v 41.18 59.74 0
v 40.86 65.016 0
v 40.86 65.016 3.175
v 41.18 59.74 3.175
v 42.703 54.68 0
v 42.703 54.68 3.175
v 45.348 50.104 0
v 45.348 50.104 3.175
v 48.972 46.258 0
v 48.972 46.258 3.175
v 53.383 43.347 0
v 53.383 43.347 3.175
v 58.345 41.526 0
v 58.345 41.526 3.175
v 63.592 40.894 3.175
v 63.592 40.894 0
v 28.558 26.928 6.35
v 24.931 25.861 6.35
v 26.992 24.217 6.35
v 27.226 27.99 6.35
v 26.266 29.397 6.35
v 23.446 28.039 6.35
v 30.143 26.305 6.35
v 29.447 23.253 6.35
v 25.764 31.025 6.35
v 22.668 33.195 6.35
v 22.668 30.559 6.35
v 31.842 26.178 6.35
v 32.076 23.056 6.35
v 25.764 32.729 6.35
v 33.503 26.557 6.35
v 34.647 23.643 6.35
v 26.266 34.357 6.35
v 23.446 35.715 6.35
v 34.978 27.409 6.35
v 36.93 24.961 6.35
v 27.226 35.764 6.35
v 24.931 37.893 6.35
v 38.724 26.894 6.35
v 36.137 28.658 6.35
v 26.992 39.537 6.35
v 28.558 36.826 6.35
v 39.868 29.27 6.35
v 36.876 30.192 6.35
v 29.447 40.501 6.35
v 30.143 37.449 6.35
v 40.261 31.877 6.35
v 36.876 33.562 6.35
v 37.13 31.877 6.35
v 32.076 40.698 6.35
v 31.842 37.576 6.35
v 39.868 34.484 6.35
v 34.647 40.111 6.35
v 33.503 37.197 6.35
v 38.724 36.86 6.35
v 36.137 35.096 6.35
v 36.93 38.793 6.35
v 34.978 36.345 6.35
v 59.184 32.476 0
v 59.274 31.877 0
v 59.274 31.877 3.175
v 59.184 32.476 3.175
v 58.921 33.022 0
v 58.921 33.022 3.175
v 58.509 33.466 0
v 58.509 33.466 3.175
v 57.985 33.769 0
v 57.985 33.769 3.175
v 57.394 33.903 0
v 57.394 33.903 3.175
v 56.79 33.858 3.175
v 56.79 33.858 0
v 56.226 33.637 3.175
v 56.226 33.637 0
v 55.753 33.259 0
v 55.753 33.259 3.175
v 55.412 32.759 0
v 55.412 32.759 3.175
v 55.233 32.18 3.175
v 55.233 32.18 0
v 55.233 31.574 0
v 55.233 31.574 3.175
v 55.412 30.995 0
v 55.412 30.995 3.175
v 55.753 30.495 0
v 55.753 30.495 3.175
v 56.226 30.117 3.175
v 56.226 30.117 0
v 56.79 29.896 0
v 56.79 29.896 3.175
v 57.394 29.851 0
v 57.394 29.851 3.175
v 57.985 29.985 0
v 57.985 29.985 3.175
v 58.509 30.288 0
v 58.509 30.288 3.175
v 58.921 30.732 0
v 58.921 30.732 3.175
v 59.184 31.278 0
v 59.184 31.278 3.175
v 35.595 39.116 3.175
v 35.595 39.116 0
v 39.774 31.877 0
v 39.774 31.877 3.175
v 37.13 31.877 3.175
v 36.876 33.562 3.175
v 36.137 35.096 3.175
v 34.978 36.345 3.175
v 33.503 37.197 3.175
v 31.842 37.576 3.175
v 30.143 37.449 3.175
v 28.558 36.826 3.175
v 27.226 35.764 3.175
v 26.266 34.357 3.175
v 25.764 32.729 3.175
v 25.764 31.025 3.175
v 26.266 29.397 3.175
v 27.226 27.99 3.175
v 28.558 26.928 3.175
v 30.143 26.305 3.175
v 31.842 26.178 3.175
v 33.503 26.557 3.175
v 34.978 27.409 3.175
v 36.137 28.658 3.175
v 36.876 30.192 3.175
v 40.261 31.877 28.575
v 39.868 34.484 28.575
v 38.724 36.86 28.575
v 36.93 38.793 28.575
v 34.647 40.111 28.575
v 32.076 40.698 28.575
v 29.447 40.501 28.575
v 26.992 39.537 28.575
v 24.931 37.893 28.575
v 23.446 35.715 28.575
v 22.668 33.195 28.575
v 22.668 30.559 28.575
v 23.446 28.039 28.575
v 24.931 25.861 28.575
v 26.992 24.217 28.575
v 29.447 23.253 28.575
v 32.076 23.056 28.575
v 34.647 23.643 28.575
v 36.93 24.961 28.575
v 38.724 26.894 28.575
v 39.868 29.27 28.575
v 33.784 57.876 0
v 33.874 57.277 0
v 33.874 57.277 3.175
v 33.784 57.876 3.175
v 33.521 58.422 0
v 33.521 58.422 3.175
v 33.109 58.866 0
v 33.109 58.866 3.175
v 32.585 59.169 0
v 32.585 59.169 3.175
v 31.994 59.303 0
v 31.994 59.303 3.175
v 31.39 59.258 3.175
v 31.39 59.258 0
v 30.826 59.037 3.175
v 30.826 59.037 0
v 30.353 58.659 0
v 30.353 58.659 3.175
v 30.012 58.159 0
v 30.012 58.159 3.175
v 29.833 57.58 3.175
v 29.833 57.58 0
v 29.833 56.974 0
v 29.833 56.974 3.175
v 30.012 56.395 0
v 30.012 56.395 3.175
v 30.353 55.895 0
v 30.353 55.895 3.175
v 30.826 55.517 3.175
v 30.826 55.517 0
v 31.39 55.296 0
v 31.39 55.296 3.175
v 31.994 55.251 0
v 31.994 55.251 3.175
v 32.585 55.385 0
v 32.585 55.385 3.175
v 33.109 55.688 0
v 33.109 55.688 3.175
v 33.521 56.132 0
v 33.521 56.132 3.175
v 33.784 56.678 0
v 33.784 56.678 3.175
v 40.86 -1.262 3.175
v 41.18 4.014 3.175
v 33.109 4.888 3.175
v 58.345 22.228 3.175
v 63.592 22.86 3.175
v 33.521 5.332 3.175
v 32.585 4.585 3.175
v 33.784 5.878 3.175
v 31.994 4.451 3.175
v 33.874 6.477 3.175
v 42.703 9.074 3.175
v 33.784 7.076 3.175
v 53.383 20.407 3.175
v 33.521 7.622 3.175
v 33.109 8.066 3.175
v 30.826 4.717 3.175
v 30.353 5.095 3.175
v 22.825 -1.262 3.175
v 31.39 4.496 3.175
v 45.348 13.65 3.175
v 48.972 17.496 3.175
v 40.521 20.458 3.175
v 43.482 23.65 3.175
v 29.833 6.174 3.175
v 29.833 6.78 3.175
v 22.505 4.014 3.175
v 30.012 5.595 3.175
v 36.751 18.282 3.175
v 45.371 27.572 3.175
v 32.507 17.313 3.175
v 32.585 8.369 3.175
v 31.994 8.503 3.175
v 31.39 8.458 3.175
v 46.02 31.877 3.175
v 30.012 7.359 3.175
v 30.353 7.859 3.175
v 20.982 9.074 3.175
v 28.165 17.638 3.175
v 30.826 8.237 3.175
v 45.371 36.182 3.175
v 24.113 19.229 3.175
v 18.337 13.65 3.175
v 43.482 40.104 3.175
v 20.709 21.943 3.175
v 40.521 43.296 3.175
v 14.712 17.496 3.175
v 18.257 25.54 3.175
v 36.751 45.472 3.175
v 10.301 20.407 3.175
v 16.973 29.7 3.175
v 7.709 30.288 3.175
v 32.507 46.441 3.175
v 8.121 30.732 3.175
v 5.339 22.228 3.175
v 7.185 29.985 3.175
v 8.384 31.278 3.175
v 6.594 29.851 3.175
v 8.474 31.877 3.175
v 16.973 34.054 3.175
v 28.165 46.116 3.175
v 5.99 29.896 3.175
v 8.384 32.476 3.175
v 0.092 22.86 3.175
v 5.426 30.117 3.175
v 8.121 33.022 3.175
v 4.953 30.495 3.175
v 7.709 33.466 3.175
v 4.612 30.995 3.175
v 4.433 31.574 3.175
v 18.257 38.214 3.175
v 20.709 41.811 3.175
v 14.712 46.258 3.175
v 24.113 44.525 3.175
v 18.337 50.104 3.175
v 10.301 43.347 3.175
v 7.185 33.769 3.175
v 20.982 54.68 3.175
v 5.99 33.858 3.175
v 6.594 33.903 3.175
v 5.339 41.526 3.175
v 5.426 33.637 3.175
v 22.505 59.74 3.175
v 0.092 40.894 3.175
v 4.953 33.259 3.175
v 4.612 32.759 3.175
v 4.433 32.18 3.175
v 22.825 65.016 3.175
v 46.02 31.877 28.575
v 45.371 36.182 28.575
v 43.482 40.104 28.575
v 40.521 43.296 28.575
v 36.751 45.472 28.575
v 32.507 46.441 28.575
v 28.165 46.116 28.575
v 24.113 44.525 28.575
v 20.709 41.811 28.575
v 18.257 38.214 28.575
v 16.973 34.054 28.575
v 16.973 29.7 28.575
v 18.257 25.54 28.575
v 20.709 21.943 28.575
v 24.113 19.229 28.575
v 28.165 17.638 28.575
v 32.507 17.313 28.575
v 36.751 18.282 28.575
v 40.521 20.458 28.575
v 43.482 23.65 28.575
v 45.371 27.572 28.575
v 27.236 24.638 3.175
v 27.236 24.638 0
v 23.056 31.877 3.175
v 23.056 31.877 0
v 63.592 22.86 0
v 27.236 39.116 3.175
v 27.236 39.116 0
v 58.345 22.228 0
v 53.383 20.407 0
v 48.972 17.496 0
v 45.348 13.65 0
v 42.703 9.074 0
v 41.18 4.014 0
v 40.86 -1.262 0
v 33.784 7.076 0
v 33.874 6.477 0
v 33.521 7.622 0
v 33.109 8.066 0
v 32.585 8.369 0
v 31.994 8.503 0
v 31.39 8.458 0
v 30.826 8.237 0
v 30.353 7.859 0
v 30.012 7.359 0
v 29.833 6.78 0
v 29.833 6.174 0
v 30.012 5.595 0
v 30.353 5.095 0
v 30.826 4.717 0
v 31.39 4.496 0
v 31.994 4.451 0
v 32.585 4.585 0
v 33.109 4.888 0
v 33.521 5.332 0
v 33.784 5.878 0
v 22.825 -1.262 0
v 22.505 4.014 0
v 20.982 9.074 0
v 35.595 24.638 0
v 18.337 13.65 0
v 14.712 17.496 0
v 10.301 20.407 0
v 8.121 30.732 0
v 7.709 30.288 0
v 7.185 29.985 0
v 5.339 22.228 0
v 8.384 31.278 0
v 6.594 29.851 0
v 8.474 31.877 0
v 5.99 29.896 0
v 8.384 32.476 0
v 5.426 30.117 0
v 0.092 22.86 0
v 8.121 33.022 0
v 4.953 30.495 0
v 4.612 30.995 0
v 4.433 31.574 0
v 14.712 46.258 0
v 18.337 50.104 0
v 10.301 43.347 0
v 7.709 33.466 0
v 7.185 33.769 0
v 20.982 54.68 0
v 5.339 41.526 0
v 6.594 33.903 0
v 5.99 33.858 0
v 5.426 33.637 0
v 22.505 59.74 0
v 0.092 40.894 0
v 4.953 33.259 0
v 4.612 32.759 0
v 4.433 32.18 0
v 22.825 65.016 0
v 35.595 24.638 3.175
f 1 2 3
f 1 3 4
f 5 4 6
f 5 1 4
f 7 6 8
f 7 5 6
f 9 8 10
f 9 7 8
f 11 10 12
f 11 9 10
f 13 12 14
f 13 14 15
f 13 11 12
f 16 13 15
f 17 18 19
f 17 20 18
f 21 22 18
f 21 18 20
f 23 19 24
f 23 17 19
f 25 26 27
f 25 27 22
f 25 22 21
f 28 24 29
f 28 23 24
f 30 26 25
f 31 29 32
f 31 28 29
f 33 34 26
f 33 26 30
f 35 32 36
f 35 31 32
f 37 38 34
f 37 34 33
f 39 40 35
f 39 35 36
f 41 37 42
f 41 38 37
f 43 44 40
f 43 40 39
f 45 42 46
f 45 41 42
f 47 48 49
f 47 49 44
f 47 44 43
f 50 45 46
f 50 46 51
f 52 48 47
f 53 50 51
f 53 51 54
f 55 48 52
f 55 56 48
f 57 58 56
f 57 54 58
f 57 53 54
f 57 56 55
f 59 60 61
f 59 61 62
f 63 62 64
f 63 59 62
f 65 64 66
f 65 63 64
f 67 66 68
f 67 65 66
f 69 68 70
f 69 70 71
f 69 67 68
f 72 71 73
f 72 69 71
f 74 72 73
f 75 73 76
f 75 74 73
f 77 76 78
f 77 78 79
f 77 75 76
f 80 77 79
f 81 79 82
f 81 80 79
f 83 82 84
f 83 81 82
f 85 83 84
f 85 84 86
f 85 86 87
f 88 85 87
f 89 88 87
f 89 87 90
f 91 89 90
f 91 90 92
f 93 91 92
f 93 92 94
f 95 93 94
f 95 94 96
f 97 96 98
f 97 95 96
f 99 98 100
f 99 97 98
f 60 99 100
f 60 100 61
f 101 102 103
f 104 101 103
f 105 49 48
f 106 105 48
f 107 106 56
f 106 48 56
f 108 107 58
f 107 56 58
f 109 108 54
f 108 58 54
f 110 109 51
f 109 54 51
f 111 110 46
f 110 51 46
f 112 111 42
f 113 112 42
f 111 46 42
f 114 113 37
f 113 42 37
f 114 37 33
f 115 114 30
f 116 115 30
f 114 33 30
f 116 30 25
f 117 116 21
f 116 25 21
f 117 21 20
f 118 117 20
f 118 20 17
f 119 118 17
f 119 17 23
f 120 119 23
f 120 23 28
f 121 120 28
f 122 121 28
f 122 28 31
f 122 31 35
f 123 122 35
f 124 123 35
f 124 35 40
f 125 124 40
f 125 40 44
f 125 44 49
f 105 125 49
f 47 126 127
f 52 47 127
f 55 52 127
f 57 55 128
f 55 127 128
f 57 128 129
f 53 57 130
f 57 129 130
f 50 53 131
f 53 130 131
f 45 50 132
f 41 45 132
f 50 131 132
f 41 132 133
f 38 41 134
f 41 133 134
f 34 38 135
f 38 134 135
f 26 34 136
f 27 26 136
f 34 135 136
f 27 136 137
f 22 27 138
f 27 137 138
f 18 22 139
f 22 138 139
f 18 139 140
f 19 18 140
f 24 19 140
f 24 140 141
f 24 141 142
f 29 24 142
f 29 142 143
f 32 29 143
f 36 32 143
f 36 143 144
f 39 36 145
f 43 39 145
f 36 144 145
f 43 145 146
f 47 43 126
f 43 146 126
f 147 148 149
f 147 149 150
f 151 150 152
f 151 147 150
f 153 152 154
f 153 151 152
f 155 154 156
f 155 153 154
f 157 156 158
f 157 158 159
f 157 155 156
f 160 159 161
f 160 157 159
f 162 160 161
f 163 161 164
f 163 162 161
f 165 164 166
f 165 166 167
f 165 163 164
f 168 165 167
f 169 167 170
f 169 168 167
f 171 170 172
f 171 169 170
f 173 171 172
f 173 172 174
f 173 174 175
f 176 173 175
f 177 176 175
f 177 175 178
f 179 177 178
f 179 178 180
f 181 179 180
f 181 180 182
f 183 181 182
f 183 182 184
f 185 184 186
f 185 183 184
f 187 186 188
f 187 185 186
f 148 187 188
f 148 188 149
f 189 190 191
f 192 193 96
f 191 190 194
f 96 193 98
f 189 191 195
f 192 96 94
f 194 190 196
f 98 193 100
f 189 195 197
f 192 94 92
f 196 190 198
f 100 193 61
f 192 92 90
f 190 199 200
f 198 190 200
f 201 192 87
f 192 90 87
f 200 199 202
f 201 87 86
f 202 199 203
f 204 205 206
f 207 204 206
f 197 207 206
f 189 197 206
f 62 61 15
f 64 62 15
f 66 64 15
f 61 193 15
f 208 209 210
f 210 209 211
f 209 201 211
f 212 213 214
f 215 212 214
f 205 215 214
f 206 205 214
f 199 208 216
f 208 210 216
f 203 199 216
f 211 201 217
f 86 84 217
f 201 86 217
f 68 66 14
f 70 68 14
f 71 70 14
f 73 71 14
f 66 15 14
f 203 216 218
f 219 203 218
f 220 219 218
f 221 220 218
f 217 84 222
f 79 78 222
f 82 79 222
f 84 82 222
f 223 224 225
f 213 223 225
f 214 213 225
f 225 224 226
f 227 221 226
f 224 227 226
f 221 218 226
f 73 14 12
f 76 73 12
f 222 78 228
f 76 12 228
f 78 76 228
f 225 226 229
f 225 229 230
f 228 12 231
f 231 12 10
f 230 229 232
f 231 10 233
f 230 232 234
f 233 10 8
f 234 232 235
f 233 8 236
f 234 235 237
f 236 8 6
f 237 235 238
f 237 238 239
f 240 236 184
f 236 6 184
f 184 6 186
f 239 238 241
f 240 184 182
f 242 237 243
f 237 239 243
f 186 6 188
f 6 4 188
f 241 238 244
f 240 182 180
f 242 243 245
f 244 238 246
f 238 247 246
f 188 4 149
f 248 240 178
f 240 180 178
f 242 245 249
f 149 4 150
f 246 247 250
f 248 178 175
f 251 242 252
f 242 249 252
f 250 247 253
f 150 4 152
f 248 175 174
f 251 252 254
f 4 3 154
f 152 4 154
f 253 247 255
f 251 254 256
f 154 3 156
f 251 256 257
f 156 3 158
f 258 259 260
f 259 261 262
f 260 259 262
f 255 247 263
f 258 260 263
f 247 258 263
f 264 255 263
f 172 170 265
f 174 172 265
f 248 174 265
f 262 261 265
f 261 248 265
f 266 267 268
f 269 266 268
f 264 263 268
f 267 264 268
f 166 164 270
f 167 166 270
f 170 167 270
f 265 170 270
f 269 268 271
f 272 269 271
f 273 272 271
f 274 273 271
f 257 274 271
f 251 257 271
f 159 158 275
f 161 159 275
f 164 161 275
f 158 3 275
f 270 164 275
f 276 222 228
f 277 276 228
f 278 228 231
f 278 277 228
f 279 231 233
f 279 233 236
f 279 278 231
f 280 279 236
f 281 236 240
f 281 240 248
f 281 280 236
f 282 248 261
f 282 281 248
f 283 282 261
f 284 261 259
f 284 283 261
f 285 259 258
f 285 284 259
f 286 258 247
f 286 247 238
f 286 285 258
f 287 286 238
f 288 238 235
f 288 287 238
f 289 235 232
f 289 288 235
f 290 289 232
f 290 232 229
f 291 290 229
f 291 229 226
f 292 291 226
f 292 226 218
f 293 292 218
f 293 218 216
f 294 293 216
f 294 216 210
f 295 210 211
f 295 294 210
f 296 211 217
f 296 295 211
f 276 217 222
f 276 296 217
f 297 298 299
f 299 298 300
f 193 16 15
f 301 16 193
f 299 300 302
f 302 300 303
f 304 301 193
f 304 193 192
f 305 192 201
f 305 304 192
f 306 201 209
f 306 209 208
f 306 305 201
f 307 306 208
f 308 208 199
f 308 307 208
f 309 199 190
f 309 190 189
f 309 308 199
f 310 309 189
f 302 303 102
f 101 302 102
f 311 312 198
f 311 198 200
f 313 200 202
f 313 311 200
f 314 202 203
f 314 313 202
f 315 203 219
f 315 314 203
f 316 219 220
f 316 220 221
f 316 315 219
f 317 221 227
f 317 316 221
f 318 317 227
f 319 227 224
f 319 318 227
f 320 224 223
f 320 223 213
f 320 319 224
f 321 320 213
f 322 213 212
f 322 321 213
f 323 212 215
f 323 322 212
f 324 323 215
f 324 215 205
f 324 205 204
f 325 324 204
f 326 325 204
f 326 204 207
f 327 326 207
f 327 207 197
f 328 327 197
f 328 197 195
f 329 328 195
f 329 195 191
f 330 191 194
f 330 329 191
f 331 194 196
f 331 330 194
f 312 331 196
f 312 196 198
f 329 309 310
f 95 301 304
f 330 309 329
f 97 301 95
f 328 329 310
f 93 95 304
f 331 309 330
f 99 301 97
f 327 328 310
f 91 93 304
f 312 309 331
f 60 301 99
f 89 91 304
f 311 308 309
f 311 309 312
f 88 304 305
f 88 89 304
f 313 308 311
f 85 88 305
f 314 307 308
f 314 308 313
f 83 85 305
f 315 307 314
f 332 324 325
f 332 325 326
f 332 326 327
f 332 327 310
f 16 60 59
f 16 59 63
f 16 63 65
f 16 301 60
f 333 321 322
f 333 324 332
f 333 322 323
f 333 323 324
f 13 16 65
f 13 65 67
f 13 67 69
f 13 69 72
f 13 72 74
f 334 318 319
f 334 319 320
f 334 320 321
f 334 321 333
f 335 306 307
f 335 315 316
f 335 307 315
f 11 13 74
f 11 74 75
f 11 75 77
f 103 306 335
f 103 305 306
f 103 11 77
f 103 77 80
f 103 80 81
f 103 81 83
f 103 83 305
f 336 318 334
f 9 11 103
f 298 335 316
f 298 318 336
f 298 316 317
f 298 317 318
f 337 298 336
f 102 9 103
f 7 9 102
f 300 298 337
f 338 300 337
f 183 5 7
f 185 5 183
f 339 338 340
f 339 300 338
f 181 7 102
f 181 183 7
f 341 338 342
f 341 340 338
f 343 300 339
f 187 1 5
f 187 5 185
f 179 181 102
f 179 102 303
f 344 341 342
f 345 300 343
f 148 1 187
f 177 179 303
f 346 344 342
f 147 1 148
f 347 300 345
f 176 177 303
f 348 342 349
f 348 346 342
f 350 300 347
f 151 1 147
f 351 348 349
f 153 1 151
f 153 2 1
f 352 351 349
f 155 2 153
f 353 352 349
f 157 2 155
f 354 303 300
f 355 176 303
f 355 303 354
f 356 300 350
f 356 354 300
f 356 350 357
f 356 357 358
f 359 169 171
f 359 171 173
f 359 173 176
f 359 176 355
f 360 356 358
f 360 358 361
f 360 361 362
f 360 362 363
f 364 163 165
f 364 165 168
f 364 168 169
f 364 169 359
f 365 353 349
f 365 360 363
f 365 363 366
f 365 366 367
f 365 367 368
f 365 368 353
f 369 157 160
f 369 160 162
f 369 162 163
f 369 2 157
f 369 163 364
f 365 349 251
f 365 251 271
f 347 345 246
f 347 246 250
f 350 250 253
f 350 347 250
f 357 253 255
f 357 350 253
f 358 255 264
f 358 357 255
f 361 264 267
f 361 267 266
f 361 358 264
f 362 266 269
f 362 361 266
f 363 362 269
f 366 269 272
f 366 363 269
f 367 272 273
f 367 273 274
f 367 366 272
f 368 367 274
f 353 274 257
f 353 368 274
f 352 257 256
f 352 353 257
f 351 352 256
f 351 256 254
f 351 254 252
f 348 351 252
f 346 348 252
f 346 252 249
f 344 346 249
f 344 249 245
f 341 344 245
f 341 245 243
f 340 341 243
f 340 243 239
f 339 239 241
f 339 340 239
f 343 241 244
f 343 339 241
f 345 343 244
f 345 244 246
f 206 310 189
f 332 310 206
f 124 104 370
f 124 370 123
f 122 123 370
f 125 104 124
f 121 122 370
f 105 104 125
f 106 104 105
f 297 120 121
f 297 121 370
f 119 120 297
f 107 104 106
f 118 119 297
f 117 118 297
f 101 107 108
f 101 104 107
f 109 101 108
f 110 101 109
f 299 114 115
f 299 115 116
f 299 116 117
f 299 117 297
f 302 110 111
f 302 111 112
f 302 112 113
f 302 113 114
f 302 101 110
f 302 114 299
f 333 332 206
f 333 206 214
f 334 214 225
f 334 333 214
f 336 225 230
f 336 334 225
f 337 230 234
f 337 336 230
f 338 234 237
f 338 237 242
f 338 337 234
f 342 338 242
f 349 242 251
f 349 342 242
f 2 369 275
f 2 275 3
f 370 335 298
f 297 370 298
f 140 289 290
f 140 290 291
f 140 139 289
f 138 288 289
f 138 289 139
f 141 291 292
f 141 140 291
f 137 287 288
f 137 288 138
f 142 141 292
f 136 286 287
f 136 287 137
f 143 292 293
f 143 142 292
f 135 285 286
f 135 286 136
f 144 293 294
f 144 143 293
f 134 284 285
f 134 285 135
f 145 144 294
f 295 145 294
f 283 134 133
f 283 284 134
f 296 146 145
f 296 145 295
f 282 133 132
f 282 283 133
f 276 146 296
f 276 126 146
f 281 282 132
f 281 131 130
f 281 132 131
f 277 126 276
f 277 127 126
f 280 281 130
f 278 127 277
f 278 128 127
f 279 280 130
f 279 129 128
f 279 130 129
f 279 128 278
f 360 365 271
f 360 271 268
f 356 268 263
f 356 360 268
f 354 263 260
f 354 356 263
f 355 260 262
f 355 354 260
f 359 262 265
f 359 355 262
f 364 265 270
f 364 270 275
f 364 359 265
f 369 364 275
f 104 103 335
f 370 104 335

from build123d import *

# Parameters (mm, degrees)
SKETCH1_R           = 2.032
BOSS_EXTRUDE1_DEPTH = 3.175
SKETCH2_R           = 5.715
CUT_EXTRUDE1_DEPTH  = 3.175
BOSS_EXTRUDE2_START = 25.4
SKETCH3_R           = 14.605
SKETCH3_R_2         = 5.715
BOSS_EXTRUDE2_DEPTH = 25.4
SKETCH6_R           = 8.845512053
CUT_EXTRUDE3_DEPTH  = 22.225
CUT_EXTRUDE5_DEPTH  = 3.175


with BuildPart() as part:
    # Sketch1 → Boss-Extrude1 (new body)
    with BuildSketch(Plane.XY):
        with BuildLine():
            Line((0.092337824, 22.85981351), (0.092337824, 40.89418649))
            ThreePointArc((0.092337824, 40.89418649), (16.63628773, 48.075558414), (22.825148771, 65.015817568))
            Line((22.825148771, 65.015817568), (40.859521751, 65.015817568))
            ThreePointArc((40.859521751, 65.015817568), (47.048382792, 48.075558414), (63.592332697, 40.89418649))
            Line((63.592332697, 40.89418649), (63.592332697, 22.85981351))
            ThreePointArc((63.592332697, 22.85981351), (47.048382792, 15.678441586), (40.859521751, -1.261817568))
            Line((40.859521751, -1.261817568), (22.825148771, -1.261817568))
            ThreePointArc((22.825148771, -1.261817568), (16.63628773, 15.678441586), (0.092337824, 22.85981351))
        make_face()
        with Locations((6.442335261, 31.877)):
            Circle(SKETCH1_R, mode=Mode.SUBTRACT)
        with Locations((31.842335261, 57.277)):
            Circle(SKETCH1_R, mode=Mode.SUBTRACT)
        with Locations((57.242335261, 31.877)):
            Circle(SKETCH1_R, mode=Mode.SUBTRACT)
        with Locations((31.842337824, 6.477)):
            Circle(SKETCH1_R, mode=Mode.SUBTRACT)
    extrude(amount=BOSS_EXTRUDE1_DEPTH)

    # Sketch2 → Cut-Extrude1 (cut)
    with BuildSketch(Plane.XY.offset(3.175)):
        with Locations((31.415168912, 31.877)):
            Circle(SKETCH2_R)
    extrude(amount=-CUT_EXTRUDE1_DEPTH, mode=Mode.SUBTRACT)

    # Sketch3 → Boss-Extrude2 (add)
    with BuildSketch(Plane.XY.offset(3.175).offset(BOSS_EXTRUDE2_START)):
        with Locations((31.415168912, 31.877)):
            Circle(SKETCH3_R)
        with Locations((31.415168912, 31.877)):
            Circle(SKETCH3_R_2, mode=Mode.SUBTRACT)
    extrude(amount=-BOSS_EXTRUDE2_DEPTH)

    # Sketch6 → Cut-Extrude3 (cut)
    with BuildSketch(Plane.XY.offset(28.575)):
        with Locations((31.415168912, 31.877)):
            Circle(SKETCH6_R)
    extrude(amount=-CUT_EXTRUDE3_DEPTH, mode=Mode.SUBTRACT)

    # Sketch7 → Cut-Extrude5 (cut)
    with BuildSketch(Plane(origin=(0, 0, 0), x_dir=(-1, 0, 0), z_dir=(0, 0, -1))):
        Polygon((-23.056493238, 31.877), (-27.235831075, 39.115825476), (-35.594506749, 39.115825476), (-39.773844587, 31.877), (-35.594506749, 24.638174524), (-27.235831075, 24.638174524), align=None)
    extrude(amount=-CUT_EXTRUDE5_DEPTH, mode=Mode.SUBTRACT)


solid = part.part
